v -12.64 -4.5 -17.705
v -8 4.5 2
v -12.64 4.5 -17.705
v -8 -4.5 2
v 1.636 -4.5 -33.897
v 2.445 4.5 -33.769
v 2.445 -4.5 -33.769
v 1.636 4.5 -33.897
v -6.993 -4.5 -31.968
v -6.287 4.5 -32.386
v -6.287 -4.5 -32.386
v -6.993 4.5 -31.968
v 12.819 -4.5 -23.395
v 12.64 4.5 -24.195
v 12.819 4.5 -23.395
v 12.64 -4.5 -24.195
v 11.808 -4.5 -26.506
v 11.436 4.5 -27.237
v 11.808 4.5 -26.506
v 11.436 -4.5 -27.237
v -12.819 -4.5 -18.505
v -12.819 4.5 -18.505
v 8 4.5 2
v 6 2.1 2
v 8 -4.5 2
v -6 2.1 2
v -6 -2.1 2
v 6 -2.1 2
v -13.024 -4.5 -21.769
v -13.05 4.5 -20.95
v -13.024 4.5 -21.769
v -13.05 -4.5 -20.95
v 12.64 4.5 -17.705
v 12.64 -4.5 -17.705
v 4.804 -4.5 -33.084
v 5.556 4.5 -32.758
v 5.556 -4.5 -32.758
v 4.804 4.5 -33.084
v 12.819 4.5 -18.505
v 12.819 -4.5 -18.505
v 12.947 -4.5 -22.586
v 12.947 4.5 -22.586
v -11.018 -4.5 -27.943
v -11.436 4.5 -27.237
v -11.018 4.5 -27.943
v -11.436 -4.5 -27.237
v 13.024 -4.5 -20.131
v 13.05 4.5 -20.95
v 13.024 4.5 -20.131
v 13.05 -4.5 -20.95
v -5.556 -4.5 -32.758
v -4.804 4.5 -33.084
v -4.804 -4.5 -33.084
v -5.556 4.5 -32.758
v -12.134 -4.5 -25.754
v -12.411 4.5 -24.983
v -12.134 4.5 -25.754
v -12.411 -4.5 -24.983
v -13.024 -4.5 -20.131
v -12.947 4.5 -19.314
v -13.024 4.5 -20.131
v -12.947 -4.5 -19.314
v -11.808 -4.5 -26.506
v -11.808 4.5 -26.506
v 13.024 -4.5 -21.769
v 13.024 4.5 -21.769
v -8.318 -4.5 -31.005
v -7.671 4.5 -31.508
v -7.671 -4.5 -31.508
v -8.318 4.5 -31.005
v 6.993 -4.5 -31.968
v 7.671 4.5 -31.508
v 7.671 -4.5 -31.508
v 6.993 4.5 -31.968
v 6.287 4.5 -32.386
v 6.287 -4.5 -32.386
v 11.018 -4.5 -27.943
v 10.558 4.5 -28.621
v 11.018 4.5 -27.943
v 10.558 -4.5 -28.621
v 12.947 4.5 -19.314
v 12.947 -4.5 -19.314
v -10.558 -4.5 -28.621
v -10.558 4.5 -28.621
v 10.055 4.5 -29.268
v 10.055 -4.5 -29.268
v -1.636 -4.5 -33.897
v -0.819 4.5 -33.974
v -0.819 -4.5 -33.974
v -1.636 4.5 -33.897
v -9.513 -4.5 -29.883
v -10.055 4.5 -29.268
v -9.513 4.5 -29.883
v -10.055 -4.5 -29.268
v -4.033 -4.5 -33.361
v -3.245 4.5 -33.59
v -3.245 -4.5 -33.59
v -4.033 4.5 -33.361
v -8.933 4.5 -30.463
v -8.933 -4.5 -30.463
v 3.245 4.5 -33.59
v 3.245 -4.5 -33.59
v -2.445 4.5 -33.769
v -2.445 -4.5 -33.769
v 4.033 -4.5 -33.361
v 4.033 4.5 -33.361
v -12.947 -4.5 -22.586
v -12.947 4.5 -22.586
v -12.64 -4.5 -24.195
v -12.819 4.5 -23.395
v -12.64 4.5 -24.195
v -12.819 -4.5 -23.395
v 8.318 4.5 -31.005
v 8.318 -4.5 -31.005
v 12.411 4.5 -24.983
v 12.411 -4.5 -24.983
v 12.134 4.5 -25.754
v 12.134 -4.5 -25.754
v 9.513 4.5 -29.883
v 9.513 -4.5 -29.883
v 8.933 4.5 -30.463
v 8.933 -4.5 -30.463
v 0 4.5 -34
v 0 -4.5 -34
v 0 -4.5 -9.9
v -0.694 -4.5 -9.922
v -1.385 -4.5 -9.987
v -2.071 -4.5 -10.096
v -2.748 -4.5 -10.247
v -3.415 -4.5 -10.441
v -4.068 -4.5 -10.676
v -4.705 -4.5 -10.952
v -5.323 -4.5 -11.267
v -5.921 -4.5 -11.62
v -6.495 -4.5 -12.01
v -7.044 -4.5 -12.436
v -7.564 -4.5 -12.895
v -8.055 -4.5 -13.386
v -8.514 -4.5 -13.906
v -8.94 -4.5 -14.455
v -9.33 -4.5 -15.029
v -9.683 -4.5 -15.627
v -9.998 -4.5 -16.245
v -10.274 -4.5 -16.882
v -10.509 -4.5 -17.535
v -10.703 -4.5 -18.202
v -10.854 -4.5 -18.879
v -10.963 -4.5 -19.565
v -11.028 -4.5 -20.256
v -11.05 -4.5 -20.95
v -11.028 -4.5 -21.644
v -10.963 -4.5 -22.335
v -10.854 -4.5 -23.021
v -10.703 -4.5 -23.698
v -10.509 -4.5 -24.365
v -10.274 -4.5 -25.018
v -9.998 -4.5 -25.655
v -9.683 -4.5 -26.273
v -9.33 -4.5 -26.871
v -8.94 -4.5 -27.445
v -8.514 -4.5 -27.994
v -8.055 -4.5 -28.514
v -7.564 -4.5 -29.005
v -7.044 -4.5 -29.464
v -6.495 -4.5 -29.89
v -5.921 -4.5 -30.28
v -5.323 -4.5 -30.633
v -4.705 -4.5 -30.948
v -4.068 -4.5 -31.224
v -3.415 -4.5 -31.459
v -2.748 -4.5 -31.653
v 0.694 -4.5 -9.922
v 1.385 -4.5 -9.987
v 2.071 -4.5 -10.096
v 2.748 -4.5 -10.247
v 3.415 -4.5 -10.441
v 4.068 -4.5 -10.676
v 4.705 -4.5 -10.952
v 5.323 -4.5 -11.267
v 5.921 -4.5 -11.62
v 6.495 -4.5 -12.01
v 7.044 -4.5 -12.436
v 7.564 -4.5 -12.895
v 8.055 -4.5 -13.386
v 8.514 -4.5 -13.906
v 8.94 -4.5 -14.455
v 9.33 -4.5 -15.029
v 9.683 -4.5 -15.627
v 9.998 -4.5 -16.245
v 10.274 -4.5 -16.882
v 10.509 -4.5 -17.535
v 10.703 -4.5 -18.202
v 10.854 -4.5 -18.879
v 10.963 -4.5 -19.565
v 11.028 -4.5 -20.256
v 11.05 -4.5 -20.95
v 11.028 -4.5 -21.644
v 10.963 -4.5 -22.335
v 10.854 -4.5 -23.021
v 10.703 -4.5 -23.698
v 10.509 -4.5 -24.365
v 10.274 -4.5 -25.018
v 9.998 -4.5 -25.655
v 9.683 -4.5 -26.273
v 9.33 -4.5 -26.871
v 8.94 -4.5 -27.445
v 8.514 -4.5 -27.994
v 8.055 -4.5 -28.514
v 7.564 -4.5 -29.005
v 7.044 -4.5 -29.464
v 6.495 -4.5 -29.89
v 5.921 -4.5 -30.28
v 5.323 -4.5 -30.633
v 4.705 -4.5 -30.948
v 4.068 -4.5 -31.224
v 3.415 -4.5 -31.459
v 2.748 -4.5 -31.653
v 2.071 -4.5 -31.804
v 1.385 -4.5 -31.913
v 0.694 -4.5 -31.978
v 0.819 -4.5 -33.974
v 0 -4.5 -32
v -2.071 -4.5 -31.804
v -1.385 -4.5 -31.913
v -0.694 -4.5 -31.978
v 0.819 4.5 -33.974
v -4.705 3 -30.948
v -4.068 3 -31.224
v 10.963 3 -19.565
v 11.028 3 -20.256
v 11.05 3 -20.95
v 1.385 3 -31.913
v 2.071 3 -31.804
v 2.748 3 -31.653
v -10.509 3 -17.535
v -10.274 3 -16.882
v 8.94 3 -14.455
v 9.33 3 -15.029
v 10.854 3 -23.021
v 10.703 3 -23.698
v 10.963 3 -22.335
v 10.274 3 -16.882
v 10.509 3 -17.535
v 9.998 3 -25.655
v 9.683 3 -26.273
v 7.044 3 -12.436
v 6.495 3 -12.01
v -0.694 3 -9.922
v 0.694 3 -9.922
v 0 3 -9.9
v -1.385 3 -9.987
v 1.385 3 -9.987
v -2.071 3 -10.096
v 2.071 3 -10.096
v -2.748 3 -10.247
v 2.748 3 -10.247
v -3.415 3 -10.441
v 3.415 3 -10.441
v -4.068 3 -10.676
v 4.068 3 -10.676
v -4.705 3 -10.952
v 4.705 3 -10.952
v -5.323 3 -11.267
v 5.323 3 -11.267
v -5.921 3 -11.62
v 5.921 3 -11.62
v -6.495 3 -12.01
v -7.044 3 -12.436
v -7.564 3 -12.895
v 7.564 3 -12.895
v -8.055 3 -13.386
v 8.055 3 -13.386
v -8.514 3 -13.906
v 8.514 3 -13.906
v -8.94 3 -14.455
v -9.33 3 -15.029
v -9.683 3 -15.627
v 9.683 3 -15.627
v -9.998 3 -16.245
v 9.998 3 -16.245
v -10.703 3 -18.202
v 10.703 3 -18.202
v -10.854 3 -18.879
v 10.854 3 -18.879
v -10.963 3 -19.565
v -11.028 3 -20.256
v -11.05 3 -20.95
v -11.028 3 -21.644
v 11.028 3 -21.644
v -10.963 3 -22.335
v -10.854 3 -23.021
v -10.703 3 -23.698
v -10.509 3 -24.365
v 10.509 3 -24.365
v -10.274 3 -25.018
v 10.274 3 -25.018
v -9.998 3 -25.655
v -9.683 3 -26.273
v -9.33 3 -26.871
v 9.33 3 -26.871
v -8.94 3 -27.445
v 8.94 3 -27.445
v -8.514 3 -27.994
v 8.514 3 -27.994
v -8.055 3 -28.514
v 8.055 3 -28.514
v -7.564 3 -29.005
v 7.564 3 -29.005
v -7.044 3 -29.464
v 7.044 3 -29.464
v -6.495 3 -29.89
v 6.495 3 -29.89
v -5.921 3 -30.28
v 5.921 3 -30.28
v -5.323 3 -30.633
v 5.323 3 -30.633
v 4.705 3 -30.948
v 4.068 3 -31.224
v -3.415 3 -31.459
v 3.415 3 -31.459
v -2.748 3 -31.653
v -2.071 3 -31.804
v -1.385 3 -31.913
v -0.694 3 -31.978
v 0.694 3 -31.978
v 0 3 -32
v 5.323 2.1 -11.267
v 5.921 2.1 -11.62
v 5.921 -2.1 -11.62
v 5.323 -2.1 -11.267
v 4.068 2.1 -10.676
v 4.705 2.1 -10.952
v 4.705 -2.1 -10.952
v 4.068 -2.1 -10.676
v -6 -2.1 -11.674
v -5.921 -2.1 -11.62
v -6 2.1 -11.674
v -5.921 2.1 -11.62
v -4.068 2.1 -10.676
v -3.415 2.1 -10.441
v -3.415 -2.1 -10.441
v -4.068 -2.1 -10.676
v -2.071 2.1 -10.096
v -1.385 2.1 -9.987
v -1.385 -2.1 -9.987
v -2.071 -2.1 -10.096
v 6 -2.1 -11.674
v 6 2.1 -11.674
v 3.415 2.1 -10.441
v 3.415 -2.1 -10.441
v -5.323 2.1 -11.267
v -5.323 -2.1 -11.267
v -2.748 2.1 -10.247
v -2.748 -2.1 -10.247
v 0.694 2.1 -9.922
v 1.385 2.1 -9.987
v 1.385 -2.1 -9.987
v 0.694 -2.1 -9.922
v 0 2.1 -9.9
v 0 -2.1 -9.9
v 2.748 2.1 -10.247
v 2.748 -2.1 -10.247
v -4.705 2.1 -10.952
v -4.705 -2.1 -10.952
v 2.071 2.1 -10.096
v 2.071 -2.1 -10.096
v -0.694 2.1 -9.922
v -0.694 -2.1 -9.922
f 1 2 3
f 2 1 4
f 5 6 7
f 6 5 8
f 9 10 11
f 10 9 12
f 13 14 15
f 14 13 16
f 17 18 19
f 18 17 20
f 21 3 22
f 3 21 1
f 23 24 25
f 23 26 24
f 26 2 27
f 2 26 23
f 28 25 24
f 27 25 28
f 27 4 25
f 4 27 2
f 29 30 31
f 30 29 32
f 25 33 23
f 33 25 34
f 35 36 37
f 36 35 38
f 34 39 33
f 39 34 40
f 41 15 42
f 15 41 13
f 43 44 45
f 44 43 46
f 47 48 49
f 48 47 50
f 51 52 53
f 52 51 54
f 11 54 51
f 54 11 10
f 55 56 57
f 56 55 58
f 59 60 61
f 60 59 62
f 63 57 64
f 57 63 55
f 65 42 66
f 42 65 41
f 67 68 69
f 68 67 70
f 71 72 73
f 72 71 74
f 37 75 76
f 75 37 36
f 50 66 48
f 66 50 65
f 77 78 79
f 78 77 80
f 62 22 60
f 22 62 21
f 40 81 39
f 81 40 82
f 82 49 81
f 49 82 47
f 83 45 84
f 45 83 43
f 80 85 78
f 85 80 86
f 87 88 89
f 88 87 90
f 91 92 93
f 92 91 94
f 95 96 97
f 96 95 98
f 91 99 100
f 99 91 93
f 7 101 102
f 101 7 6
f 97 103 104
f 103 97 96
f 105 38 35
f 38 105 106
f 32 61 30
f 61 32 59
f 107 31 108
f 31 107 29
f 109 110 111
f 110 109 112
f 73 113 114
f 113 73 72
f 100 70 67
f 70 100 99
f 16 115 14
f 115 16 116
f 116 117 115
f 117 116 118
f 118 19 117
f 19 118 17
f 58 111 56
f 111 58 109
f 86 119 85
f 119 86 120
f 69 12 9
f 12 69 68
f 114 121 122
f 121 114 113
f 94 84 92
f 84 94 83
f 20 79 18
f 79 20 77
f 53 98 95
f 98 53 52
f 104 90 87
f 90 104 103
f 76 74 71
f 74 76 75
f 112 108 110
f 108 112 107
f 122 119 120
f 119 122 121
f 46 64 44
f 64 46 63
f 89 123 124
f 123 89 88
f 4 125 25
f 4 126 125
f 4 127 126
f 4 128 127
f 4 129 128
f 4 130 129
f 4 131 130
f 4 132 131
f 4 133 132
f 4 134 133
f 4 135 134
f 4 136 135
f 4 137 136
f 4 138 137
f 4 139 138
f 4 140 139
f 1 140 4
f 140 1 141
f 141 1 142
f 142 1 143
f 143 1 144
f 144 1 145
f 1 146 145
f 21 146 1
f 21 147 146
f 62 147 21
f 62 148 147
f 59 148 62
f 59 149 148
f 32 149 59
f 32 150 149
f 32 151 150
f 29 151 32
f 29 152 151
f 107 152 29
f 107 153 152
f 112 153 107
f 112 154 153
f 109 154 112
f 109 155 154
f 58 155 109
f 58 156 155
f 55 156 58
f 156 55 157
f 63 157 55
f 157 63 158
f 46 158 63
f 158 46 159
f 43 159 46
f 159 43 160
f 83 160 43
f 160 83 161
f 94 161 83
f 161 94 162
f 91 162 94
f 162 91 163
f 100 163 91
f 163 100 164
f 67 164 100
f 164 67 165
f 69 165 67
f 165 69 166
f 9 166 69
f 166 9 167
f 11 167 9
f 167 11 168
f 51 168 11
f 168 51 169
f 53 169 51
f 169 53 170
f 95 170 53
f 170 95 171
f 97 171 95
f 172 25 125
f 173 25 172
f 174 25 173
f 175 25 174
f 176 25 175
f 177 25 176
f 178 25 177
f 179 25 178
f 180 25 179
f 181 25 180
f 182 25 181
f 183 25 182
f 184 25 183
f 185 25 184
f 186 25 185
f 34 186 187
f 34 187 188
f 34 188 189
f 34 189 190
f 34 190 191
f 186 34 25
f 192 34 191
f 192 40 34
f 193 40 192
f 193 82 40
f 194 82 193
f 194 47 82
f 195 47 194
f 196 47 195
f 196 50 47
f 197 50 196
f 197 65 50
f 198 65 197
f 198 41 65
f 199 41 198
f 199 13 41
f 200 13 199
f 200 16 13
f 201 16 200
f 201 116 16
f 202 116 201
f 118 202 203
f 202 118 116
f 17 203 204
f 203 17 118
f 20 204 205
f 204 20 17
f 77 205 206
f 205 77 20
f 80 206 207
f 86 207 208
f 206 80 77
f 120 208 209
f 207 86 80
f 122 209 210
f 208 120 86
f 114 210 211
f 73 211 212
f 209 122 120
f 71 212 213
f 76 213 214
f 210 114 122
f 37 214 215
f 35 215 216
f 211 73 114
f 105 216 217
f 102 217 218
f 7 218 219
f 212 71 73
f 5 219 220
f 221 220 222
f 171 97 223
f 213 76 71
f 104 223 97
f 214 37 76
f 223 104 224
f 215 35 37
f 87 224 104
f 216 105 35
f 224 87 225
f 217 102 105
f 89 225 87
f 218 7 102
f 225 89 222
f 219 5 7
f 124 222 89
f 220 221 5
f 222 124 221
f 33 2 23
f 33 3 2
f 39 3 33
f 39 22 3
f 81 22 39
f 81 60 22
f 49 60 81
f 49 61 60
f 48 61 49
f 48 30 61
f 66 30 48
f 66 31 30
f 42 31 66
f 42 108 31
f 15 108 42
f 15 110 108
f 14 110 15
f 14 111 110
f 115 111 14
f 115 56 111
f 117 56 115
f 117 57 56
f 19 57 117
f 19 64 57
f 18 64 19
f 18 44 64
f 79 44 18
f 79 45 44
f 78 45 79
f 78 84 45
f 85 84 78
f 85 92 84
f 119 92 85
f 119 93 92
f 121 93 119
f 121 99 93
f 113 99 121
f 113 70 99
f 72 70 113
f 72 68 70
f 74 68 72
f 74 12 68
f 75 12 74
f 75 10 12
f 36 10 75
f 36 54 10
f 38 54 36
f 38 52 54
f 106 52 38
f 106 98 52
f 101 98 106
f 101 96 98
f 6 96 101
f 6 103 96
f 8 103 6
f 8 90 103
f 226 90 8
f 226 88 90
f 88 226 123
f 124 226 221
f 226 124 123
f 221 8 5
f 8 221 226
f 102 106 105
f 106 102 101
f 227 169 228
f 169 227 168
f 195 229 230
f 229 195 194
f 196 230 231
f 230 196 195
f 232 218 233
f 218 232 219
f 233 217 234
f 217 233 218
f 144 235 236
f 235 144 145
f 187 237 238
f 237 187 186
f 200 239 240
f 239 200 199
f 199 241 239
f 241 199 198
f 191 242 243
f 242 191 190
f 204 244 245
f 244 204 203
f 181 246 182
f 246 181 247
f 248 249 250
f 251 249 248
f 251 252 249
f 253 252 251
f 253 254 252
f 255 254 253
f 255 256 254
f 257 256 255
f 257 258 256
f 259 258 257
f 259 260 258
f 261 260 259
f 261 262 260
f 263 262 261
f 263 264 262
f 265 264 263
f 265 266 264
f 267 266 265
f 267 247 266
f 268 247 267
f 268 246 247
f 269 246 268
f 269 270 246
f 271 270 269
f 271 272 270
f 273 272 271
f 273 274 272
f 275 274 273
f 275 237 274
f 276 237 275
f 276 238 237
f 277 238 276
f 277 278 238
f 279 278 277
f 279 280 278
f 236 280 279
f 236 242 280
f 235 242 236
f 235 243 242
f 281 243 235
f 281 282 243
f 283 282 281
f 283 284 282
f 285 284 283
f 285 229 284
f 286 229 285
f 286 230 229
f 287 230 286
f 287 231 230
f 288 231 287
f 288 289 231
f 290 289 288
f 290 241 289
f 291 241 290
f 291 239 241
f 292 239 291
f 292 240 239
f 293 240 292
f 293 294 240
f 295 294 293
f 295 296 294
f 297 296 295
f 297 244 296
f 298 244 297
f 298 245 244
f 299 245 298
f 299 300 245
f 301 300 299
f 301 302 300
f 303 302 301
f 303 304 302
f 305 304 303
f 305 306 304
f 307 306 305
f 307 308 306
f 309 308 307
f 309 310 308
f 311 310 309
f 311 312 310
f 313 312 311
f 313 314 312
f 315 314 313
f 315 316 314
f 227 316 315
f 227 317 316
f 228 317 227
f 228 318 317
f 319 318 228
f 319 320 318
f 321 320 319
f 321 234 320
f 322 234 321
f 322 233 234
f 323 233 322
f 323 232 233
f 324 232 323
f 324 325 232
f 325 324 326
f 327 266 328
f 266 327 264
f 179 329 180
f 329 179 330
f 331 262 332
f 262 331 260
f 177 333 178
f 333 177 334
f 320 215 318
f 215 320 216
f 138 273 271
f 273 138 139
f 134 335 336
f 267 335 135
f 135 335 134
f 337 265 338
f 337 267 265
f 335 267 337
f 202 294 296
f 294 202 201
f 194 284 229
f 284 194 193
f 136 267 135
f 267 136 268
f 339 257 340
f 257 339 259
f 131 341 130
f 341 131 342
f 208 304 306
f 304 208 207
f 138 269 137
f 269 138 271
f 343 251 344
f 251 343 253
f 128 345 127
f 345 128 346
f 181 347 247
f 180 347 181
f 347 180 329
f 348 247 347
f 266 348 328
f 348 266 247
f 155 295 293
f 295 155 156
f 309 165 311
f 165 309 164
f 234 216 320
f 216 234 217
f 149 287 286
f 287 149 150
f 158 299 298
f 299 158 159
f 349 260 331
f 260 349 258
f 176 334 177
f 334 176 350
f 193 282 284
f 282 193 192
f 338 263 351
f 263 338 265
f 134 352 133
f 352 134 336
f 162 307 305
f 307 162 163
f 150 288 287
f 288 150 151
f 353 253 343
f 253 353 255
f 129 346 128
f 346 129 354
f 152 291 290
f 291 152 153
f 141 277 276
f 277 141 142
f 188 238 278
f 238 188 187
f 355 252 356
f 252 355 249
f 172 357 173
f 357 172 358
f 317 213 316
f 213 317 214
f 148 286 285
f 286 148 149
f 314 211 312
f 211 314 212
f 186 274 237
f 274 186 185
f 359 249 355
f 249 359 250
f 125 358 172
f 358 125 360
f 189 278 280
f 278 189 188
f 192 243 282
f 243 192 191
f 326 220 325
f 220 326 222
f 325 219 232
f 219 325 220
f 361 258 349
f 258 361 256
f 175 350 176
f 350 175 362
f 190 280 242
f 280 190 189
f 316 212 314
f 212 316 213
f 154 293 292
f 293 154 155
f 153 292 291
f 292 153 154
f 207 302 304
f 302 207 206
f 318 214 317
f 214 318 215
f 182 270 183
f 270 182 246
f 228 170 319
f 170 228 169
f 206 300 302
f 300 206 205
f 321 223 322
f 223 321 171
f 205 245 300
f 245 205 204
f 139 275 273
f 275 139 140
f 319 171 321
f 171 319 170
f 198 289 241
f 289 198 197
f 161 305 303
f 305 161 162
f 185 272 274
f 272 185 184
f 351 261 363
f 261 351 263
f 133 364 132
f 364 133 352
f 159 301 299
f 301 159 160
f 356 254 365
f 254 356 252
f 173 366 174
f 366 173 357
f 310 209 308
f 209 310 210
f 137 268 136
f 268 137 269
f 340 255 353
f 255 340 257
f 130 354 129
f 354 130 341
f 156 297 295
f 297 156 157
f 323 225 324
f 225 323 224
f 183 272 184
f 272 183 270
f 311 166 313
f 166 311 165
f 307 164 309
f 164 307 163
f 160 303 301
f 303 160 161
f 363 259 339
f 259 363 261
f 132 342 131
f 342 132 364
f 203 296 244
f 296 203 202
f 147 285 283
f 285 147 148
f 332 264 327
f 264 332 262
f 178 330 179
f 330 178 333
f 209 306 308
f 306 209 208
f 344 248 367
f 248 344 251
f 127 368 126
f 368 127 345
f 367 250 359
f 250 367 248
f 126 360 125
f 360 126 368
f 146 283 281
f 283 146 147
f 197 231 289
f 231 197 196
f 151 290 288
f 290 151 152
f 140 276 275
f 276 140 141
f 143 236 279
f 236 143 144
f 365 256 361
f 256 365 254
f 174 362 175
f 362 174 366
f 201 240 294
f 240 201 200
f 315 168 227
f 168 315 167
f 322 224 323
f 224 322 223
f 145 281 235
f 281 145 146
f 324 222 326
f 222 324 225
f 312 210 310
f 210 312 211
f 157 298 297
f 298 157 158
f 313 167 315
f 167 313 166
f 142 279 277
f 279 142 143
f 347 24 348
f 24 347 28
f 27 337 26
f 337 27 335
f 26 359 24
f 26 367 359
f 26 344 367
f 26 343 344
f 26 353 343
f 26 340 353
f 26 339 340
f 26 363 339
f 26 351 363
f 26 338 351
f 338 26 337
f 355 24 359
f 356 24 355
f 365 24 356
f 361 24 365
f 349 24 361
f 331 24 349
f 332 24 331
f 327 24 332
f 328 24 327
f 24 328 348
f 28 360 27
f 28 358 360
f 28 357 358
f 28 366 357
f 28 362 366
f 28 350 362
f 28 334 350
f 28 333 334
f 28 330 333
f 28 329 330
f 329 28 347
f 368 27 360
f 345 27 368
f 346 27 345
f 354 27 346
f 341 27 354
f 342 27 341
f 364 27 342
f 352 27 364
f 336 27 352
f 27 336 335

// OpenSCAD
metalX=12;
metalY=4.2;
metalZ=4;

plasticC=2;

bearingR=22.1/2;
bearingH=7;
precission=100;

difference(){
hull(){
translate([0,0,0]) cube([metalX+2*plasticC,bearingH+plasticC,metalZ], center=true);
translate([0,0,-bearingR-9.9])  rotate([90,0,0]) 
cylinder(r=bearingR+plasticC, h=bearingH+plasticC, center=true, $fn = precission); 
}
translate([0,0+0.5,-bearingR-9.9])  rotate([90,0,0]) 
translate([0,0,plasticC]) cylinder(r =bearingR, h=bearingH+plasticC, center=true, $fn = precission); 
translate([0,0,5]) cube([metalX,metalY,metalZ+40], center=true);
}
